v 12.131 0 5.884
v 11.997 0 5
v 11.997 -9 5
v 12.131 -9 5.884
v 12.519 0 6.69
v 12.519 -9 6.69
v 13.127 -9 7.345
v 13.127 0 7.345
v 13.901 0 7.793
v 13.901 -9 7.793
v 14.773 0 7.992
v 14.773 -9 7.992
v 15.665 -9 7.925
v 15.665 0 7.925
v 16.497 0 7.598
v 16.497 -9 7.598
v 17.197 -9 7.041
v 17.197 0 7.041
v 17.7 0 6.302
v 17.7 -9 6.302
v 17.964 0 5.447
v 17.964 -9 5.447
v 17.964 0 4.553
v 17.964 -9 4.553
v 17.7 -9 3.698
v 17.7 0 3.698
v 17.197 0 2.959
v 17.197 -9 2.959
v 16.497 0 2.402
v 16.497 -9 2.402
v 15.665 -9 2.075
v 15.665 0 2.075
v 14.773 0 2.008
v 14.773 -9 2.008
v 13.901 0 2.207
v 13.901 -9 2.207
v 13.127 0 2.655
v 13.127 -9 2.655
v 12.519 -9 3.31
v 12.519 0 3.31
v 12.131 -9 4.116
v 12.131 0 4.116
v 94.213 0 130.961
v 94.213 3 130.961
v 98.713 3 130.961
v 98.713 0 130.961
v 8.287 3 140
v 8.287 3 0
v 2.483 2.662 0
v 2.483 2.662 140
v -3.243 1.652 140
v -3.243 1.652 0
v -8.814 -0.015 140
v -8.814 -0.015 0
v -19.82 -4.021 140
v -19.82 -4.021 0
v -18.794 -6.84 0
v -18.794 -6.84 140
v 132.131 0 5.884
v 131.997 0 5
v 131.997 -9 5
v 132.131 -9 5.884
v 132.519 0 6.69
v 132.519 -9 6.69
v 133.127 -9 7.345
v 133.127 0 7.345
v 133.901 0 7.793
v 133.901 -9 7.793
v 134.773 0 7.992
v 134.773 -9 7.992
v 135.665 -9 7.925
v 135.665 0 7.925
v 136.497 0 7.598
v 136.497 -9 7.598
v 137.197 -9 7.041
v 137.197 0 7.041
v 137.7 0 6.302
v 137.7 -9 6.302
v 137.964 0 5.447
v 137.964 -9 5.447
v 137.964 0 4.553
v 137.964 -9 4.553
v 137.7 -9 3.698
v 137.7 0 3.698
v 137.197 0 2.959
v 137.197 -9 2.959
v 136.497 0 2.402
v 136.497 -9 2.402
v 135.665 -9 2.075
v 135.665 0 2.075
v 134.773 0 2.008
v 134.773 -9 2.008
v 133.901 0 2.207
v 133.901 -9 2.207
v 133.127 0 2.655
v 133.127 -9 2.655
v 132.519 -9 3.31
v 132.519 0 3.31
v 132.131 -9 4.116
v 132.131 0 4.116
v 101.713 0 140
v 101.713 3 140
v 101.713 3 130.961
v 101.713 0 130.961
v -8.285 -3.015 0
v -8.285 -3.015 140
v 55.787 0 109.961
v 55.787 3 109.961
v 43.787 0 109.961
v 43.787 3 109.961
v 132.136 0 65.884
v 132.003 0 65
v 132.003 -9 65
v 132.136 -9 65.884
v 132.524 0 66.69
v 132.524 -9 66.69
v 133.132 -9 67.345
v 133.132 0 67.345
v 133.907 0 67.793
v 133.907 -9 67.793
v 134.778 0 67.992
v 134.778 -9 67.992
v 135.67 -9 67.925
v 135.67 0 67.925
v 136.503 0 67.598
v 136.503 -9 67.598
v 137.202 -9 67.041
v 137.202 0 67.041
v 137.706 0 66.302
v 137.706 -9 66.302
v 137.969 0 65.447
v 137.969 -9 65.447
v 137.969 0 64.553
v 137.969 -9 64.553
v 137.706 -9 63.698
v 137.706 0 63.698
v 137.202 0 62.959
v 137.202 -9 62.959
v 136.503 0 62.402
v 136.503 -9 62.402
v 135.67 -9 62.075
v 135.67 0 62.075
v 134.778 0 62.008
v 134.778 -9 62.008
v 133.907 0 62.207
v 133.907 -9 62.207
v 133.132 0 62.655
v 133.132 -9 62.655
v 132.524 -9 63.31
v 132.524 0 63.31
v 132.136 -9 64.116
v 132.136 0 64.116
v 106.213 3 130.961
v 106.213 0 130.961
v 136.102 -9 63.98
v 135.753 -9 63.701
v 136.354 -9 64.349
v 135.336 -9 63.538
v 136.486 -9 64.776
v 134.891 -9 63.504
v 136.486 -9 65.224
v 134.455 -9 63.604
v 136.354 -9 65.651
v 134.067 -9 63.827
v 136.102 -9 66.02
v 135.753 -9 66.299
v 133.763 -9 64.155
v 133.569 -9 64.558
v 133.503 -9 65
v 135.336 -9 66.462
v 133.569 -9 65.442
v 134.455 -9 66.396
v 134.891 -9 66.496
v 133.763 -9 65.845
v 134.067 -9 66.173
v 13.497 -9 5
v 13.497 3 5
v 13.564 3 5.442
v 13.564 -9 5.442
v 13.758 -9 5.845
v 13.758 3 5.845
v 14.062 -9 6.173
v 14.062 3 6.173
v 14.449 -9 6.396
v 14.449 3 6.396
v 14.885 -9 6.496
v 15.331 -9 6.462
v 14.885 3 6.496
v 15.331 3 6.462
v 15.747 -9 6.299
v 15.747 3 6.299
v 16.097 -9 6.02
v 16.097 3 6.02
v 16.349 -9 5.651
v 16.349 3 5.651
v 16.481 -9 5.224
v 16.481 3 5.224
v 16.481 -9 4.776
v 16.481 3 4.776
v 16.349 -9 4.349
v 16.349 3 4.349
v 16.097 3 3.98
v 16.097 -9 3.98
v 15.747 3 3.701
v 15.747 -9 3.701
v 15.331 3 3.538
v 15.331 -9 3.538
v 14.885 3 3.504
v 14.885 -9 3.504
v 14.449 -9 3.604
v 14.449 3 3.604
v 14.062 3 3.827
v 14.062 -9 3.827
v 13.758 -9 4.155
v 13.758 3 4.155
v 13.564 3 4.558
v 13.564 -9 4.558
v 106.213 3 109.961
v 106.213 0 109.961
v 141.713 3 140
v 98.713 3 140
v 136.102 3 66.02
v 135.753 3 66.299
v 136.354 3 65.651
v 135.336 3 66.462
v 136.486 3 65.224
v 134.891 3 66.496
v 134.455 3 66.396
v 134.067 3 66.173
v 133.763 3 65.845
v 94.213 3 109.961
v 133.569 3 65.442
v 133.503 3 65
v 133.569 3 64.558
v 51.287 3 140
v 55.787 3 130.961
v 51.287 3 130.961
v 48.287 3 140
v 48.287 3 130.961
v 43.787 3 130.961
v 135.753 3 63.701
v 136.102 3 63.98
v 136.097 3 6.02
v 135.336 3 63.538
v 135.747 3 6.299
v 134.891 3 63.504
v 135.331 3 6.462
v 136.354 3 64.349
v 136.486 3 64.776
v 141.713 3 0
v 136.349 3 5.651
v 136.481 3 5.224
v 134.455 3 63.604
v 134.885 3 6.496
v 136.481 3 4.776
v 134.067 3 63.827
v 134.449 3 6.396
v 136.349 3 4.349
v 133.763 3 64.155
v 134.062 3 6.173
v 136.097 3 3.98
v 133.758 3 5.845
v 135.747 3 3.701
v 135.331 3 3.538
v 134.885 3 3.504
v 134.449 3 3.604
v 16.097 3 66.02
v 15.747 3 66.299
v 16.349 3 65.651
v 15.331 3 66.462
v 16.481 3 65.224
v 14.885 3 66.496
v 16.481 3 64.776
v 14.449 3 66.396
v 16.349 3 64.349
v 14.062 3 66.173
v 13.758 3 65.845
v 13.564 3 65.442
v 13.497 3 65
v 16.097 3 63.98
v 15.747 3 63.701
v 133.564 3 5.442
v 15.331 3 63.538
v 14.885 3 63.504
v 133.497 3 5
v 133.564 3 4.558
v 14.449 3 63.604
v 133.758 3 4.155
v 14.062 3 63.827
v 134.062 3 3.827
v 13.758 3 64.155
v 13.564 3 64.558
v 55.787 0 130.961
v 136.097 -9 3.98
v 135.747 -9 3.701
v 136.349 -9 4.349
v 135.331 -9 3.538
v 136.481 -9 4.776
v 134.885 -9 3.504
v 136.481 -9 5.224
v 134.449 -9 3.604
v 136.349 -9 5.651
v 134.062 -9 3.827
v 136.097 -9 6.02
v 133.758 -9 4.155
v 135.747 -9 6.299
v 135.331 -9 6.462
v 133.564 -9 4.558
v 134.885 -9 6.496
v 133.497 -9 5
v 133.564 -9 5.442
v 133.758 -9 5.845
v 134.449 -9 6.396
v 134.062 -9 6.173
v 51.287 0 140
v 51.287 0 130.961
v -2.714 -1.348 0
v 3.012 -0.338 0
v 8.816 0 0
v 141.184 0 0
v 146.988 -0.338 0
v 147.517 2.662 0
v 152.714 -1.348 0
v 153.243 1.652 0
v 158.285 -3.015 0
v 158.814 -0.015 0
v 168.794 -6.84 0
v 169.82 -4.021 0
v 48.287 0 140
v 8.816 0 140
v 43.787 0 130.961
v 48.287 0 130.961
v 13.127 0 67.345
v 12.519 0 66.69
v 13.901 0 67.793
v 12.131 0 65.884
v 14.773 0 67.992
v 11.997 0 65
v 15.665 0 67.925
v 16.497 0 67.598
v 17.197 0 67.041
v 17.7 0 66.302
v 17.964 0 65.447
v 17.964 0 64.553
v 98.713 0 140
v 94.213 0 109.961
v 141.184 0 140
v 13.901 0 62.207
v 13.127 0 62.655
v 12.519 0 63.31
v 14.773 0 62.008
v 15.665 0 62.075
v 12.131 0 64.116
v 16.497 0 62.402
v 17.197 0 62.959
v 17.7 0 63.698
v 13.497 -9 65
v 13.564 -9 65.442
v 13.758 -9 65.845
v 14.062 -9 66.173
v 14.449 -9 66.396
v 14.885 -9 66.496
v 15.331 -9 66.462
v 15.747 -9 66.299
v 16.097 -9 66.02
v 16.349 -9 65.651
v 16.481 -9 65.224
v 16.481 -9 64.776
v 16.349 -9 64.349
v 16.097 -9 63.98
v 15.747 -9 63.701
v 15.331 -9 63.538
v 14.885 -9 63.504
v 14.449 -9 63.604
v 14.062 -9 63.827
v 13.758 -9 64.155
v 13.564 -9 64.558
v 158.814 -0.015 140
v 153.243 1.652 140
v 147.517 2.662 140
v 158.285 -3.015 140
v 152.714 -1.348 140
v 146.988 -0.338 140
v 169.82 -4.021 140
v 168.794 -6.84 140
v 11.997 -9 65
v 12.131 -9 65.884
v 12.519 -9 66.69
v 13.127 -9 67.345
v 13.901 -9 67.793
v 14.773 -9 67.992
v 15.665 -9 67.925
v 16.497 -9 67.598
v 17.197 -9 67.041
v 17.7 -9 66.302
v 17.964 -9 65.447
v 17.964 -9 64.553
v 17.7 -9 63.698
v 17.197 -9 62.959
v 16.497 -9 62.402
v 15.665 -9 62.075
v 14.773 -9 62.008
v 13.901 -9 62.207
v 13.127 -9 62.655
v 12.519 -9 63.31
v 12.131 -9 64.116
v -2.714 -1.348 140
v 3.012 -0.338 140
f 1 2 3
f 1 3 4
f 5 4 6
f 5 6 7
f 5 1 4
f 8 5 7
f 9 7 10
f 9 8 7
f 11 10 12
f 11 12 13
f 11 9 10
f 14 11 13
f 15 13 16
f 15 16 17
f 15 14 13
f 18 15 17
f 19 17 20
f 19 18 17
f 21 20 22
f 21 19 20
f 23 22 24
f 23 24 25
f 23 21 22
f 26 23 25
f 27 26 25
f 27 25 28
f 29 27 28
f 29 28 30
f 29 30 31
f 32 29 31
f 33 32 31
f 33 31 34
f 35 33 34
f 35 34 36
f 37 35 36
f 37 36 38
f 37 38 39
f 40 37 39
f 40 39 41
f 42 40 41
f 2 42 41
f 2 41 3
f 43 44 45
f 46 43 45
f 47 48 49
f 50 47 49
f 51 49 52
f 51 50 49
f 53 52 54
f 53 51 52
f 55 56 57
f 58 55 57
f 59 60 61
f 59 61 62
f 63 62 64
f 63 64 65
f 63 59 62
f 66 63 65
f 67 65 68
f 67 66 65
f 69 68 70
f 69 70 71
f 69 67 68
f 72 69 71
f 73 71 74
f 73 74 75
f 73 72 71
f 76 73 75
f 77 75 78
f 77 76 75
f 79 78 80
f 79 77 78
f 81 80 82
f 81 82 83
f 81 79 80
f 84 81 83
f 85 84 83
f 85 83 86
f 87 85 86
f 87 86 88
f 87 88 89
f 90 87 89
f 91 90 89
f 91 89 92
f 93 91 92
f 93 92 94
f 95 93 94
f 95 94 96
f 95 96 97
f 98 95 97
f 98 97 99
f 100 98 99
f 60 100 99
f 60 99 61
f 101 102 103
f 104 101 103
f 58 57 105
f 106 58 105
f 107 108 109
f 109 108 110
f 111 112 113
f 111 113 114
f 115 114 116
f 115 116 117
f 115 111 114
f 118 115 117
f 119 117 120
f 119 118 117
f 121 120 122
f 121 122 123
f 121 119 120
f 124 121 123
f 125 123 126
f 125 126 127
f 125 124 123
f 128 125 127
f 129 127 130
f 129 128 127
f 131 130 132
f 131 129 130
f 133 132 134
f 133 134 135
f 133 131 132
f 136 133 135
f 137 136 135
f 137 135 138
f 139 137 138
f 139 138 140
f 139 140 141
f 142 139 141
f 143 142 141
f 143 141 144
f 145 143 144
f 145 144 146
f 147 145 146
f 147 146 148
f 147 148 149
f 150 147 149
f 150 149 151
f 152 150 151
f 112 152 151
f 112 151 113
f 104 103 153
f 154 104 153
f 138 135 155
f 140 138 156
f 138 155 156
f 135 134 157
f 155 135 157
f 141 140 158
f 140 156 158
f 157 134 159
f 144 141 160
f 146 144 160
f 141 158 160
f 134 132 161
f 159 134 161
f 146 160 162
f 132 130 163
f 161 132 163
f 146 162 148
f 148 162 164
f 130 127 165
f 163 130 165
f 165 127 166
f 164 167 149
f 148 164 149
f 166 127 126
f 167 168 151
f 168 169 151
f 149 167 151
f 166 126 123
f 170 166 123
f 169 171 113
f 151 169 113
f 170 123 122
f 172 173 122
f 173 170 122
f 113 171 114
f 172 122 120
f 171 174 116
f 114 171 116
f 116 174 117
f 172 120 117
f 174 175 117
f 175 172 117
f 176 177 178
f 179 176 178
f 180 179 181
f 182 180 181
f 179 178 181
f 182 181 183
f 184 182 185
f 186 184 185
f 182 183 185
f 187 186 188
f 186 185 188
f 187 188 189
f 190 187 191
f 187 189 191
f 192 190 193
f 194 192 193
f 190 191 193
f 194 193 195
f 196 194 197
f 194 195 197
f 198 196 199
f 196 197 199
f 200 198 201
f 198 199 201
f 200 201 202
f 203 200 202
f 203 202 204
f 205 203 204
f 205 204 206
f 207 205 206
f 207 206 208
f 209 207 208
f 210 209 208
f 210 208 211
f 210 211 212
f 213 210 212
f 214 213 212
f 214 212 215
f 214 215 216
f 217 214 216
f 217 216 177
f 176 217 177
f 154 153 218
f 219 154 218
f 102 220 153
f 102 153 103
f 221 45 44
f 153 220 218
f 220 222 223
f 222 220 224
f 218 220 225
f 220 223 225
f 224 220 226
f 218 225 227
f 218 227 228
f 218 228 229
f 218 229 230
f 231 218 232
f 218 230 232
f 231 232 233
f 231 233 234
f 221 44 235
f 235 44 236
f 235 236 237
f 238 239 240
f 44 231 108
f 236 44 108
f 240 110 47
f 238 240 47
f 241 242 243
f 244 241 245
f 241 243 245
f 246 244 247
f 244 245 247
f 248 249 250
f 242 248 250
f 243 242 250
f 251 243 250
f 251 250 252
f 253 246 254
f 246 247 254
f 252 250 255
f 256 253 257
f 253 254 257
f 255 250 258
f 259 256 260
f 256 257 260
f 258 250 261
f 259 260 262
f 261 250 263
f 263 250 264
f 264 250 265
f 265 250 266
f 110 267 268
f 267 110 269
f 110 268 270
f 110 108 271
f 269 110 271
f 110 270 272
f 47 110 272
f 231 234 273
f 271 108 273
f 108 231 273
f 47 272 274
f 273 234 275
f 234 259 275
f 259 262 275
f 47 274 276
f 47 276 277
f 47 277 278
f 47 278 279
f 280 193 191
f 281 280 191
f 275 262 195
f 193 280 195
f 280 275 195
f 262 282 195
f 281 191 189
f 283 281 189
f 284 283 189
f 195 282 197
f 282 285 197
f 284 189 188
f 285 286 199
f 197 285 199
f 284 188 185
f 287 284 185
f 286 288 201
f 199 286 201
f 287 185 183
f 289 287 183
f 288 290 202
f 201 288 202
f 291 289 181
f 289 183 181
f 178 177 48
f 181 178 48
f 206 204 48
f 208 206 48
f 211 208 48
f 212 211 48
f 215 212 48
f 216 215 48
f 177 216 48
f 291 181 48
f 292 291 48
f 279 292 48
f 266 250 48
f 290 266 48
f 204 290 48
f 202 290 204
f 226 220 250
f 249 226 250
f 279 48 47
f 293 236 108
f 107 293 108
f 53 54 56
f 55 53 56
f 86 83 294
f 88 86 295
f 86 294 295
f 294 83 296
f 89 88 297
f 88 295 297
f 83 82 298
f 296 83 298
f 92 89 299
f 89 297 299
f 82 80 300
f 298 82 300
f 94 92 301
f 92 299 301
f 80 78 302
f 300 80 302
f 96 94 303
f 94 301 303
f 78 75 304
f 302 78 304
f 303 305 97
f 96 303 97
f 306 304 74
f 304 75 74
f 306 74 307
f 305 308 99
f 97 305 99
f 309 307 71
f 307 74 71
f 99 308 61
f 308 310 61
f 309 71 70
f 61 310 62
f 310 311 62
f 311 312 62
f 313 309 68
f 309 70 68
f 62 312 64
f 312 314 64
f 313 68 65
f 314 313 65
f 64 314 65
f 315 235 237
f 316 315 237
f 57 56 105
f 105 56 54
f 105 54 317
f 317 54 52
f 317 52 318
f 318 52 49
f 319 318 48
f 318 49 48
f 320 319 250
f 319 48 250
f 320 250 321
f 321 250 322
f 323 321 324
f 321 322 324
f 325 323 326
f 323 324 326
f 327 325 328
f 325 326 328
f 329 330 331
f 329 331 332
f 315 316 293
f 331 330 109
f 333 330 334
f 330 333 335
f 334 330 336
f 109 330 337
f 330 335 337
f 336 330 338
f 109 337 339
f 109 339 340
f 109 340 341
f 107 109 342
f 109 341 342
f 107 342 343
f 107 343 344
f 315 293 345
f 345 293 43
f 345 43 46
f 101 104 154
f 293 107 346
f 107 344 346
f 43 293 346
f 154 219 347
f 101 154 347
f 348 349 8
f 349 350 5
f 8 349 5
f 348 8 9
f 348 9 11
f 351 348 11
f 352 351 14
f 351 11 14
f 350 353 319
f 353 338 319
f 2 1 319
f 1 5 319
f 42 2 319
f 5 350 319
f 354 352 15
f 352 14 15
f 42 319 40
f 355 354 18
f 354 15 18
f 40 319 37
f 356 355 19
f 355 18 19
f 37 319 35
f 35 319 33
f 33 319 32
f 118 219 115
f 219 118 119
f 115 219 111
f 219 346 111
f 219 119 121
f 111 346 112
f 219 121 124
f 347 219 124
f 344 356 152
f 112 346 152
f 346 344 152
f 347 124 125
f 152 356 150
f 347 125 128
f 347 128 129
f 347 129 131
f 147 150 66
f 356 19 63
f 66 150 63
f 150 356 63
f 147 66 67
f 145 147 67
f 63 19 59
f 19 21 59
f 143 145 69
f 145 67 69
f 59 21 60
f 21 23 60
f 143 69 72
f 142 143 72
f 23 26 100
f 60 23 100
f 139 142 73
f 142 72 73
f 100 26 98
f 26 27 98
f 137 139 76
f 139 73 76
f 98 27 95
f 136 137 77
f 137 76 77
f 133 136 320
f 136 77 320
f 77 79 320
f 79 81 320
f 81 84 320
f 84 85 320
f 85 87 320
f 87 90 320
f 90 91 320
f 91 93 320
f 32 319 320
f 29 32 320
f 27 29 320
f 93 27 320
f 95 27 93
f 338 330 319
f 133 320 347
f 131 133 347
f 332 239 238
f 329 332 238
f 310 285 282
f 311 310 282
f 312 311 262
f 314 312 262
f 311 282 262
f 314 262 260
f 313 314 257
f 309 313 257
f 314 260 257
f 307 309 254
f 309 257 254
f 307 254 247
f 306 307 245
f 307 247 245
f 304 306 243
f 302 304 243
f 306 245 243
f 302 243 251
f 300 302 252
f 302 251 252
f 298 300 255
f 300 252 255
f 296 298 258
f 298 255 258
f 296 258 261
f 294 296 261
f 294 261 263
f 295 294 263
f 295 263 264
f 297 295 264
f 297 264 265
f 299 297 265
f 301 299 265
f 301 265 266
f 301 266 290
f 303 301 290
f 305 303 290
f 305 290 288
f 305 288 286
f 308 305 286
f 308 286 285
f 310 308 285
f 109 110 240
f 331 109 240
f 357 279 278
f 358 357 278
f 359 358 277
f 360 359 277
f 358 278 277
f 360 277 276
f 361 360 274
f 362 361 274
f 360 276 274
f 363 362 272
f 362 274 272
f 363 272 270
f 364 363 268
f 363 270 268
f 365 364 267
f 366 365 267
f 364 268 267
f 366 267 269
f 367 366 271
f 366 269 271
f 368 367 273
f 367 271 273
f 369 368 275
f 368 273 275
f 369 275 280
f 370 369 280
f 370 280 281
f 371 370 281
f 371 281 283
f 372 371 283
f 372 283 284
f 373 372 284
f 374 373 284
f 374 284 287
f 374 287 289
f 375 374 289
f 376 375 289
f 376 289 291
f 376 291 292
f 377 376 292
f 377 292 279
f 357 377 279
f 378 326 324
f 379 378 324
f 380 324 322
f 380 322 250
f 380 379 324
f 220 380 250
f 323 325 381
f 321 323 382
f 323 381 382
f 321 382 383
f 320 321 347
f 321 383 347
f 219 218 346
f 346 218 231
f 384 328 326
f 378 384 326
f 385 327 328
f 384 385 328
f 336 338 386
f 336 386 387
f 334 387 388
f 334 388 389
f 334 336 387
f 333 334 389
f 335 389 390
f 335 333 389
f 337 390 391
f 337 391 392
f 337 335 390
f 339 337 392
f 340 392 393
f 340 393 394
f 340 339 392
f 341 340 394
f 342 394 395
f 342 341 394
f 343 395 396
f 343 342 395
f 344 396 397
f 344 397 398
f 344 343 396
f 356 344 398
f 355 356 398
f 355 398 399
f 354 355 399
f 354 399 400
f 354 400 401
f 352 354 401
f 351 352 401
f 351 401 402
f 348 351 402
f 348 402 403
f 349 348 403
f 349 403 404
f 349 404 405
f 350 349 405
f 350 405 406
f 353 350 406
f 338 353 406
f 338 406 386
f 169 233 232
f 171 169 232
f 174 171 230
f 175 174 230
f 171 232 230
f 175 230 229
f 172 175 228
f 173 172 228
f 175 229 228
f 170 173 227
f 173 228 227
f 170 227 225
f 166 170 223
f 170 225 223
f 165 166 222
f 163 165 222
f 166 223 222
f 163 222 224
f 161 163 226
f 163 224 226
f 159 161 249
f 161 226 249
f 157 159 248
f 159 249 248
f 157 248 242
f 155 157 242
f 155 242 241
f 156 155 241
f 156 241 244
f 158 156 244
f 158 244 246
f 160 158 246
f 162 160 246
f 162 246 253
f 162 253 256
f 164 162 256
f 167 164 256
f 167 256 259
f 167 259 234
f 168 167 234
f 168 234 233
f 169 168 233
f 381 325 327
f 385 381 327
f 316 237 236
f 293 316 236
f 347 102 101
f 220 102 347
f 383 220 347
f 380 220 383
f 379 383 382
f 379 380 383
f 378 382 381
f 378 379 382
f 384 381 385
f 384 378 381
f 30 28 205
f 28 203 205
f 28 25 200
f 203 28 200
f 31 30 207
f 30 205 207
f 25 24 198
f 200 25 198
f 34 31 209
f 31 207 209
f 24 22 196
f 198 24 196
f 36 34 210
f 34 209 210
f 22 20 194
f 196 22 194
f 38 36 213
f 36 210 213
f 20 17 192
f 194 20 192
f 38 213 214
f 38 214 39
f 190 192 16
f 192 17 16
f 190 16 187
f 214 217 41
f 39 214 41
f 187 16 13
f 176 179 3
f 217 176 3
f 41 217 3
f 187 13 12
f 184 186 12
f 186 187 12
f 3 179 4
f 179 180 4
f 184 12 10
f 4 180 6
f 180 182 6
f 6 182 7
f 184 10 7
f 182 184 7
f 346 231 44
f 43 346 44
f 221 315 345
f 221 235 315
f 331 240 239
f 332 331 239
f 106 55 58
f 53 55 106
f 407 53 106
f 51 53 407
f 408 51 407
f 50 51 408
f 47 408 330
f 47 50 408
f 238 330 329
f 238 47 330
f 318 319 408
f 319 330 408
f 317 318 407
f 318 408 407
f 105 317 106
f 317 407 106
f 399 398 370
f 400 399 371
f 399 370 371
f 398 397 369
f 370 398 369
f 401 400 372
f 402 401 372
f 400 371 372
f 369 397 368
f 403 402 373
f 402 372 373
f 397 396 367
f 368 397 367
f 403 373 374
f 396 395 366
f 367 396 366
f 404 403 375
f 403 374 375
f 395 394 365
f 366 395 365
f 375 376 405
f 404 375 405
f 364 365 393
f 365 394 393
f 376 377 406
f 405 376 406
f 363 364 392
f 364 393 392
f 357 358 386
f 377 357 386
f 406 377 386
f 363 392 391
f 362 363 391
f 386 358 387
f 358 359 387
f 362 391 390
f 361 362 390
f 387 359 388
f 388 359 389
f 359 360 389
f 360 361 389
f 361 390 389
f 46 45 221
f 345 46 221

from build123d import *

# Parameters (mm, degrees)
BOSS_EXTRUDE1_DEPTH = 140
FILLET1_R           = 50
FILLET2_R           = 50
CUT_EXTRUDE1_DEPTH  = 150
SKETCH4_R           = 1.5
CUT_EXTRUDE2_DEPTH  = 10
SKETCH5_R           = 3
SKETCH5_R_2         = 1.5
BOSS_EXTRUDE2_DEPTH = 12


with BuildPart() as part:
    # Sketch1 → Boss-Extrude1 (new body)
    with BuildSketch(Plane.XY):
        Polygon((0, 0), (150, 0), (168.793852416, -6.840402867), (169.819912846, -4.021325004), (150.528980942, 3), (-0.528980942, 3), (-19.819912846, -4.021325004), (-18.793852416, -6.840402867), align=None)
    extrude(amount=BOSS_EXTRUDE1_DEPTH)

    # Fillet1
    fillet1_edges = [part.edges().sort_by_distance(p)[0] for p in [
        (-0.528980942, 3, 70),
        (150.528980942, 3, 70),
    ]]
    fillet(fillet1_edges, radius=FILLET1_R)

    # Fillet2
    fillet2_edges = [part.edges().sort_by_distance(p)[0] for p in [
        (150, 0, 70),
        (0, 0, 70),
    ]]
    fillet(fillet2_edges, radius=FILLET2_R)

    # Sketch3 → Cut-Extrude1 (cut)
    with BuildSketch(Plane(origin=(0, 3, 0), x_dir=(1, 0, 0), z_dir=(0, 1, 0))):
        Polygon((101.712631907, -140), (101.712631907, -130.960680496), (106.212631907, -130.960680496), (106.212631907, -109.960680496), (94.212631907, -109.960680496), (94.212631907, -130.960680496), (98.712631907, -130.960680496), (98.712631907, -140), align=None)
        Polygon((51.287368093, -140), (51.287368093, -130.960680496), (55.787368093, -130.960680496), (55.787368093, -109.960680496), (43.787368093, -109.960680496), (43.787368093, -130.960680496), (48.287368093, -130.960680496), (48.287368093, -140), align=None)
    extrude(amount=-CUT_EXTRUDE1_DEPTH, mode=Mode.SUBTRACT)

    # Sketch4 → Cut-Extrude2 (cut)
    with BuildSketch(Plane(origin=(0, 3, 0), x_dir=(1, 0, 0), z_dir=(0, 1, 0))):
        with Locations(Location((134.997368093, -5, 0), (0, 0, 180))):
            Circle(SKETCH4_R)
        with Locations(Location((14.997368093, -5, 0), (0, 0, 180))):
            Circle(SKETCH4_R)
        with Locations(Location((135.002631907, -64.999999769, 0), (0, 0, 180))):
            Circle(SKETCH4_R)
        with Locations(Location((14.997368093, -64.999999769, 0), (0, 0, 180))):
            Circle(SKETCH4_R)
    extrude(amount=-CUT_EXTRUDE2_DEPTH, mode=Mode.SUBTRACT)

    # Sketch5 → Boss-Extrude2 (add)
    # profile 1 of 4: a face of its own
    with BuildSketch(Plane(origin=(0, 3, 0), x_dir=(1, 0, 0), z_dir=(0, 1, 0))):
        with Locations(Location((14.997368093, -5, 0), (0, 0, 180))):
            Circle(SKETCH5_R)
        with Locations(Location((14.997368093, -5, 0), (0, 0, 180))):
            Circle(SKETCH5_R_2, mode=Mode.SUBTRACT)
    # profile 2 of 4: a face of its own
    with BuildSketch(Plane(origin=(0, 3, 0), x_dir=(1, 0, 0), z_dir=(0, 1, 0))):
        with Locations(Location((134.997368093, -5, 0), (0, 0, 180))):
            Circle(SKETCH5_R)
        with Locations(Location((134.997368093, -5, 0), (0, 0, 180))):
            Circle(SKETCH5_R_2, mode=Mode.SUBTRACT)
    # profile 3 of 4: a face of its own
    with BuildSketch(Plane(origin=(0, 3, 0), x_dir=(1, 0, 0), z_dir=(0, 1, 0))):
        with Locations(Location((135.002631907, -64.999999769, 0), (0, 0, 180))):
            Circle(SKETCH5_R)
        with Locations(Location((135.002631907, -64.999999769, 0), (0, 0, 180))):
            Circle(SKETCH5_R_2, mode=Mode.SUBTRACT)
    # profile 4 of 4: a face of its own
    with BuildSketch(Plane(origin=(0, 3, 0), x_dir=(1, 0, 0), z_dir=(0, 1, 0))):
        with Locations(Location((14.997368093, -64.999999769, 0), (0, 0, 180))):
            Circle(SKETCH5_R)
        with Locations(Location((14.997368093, -64.999999769, 0), (0, 0, 180))):
            Circle(SKETCH5_R_2, mode=Mode.SUBTRACT)
    extrude(amount=-BOSS_EXTRUDE2_DEPTH)


solid = part.part
